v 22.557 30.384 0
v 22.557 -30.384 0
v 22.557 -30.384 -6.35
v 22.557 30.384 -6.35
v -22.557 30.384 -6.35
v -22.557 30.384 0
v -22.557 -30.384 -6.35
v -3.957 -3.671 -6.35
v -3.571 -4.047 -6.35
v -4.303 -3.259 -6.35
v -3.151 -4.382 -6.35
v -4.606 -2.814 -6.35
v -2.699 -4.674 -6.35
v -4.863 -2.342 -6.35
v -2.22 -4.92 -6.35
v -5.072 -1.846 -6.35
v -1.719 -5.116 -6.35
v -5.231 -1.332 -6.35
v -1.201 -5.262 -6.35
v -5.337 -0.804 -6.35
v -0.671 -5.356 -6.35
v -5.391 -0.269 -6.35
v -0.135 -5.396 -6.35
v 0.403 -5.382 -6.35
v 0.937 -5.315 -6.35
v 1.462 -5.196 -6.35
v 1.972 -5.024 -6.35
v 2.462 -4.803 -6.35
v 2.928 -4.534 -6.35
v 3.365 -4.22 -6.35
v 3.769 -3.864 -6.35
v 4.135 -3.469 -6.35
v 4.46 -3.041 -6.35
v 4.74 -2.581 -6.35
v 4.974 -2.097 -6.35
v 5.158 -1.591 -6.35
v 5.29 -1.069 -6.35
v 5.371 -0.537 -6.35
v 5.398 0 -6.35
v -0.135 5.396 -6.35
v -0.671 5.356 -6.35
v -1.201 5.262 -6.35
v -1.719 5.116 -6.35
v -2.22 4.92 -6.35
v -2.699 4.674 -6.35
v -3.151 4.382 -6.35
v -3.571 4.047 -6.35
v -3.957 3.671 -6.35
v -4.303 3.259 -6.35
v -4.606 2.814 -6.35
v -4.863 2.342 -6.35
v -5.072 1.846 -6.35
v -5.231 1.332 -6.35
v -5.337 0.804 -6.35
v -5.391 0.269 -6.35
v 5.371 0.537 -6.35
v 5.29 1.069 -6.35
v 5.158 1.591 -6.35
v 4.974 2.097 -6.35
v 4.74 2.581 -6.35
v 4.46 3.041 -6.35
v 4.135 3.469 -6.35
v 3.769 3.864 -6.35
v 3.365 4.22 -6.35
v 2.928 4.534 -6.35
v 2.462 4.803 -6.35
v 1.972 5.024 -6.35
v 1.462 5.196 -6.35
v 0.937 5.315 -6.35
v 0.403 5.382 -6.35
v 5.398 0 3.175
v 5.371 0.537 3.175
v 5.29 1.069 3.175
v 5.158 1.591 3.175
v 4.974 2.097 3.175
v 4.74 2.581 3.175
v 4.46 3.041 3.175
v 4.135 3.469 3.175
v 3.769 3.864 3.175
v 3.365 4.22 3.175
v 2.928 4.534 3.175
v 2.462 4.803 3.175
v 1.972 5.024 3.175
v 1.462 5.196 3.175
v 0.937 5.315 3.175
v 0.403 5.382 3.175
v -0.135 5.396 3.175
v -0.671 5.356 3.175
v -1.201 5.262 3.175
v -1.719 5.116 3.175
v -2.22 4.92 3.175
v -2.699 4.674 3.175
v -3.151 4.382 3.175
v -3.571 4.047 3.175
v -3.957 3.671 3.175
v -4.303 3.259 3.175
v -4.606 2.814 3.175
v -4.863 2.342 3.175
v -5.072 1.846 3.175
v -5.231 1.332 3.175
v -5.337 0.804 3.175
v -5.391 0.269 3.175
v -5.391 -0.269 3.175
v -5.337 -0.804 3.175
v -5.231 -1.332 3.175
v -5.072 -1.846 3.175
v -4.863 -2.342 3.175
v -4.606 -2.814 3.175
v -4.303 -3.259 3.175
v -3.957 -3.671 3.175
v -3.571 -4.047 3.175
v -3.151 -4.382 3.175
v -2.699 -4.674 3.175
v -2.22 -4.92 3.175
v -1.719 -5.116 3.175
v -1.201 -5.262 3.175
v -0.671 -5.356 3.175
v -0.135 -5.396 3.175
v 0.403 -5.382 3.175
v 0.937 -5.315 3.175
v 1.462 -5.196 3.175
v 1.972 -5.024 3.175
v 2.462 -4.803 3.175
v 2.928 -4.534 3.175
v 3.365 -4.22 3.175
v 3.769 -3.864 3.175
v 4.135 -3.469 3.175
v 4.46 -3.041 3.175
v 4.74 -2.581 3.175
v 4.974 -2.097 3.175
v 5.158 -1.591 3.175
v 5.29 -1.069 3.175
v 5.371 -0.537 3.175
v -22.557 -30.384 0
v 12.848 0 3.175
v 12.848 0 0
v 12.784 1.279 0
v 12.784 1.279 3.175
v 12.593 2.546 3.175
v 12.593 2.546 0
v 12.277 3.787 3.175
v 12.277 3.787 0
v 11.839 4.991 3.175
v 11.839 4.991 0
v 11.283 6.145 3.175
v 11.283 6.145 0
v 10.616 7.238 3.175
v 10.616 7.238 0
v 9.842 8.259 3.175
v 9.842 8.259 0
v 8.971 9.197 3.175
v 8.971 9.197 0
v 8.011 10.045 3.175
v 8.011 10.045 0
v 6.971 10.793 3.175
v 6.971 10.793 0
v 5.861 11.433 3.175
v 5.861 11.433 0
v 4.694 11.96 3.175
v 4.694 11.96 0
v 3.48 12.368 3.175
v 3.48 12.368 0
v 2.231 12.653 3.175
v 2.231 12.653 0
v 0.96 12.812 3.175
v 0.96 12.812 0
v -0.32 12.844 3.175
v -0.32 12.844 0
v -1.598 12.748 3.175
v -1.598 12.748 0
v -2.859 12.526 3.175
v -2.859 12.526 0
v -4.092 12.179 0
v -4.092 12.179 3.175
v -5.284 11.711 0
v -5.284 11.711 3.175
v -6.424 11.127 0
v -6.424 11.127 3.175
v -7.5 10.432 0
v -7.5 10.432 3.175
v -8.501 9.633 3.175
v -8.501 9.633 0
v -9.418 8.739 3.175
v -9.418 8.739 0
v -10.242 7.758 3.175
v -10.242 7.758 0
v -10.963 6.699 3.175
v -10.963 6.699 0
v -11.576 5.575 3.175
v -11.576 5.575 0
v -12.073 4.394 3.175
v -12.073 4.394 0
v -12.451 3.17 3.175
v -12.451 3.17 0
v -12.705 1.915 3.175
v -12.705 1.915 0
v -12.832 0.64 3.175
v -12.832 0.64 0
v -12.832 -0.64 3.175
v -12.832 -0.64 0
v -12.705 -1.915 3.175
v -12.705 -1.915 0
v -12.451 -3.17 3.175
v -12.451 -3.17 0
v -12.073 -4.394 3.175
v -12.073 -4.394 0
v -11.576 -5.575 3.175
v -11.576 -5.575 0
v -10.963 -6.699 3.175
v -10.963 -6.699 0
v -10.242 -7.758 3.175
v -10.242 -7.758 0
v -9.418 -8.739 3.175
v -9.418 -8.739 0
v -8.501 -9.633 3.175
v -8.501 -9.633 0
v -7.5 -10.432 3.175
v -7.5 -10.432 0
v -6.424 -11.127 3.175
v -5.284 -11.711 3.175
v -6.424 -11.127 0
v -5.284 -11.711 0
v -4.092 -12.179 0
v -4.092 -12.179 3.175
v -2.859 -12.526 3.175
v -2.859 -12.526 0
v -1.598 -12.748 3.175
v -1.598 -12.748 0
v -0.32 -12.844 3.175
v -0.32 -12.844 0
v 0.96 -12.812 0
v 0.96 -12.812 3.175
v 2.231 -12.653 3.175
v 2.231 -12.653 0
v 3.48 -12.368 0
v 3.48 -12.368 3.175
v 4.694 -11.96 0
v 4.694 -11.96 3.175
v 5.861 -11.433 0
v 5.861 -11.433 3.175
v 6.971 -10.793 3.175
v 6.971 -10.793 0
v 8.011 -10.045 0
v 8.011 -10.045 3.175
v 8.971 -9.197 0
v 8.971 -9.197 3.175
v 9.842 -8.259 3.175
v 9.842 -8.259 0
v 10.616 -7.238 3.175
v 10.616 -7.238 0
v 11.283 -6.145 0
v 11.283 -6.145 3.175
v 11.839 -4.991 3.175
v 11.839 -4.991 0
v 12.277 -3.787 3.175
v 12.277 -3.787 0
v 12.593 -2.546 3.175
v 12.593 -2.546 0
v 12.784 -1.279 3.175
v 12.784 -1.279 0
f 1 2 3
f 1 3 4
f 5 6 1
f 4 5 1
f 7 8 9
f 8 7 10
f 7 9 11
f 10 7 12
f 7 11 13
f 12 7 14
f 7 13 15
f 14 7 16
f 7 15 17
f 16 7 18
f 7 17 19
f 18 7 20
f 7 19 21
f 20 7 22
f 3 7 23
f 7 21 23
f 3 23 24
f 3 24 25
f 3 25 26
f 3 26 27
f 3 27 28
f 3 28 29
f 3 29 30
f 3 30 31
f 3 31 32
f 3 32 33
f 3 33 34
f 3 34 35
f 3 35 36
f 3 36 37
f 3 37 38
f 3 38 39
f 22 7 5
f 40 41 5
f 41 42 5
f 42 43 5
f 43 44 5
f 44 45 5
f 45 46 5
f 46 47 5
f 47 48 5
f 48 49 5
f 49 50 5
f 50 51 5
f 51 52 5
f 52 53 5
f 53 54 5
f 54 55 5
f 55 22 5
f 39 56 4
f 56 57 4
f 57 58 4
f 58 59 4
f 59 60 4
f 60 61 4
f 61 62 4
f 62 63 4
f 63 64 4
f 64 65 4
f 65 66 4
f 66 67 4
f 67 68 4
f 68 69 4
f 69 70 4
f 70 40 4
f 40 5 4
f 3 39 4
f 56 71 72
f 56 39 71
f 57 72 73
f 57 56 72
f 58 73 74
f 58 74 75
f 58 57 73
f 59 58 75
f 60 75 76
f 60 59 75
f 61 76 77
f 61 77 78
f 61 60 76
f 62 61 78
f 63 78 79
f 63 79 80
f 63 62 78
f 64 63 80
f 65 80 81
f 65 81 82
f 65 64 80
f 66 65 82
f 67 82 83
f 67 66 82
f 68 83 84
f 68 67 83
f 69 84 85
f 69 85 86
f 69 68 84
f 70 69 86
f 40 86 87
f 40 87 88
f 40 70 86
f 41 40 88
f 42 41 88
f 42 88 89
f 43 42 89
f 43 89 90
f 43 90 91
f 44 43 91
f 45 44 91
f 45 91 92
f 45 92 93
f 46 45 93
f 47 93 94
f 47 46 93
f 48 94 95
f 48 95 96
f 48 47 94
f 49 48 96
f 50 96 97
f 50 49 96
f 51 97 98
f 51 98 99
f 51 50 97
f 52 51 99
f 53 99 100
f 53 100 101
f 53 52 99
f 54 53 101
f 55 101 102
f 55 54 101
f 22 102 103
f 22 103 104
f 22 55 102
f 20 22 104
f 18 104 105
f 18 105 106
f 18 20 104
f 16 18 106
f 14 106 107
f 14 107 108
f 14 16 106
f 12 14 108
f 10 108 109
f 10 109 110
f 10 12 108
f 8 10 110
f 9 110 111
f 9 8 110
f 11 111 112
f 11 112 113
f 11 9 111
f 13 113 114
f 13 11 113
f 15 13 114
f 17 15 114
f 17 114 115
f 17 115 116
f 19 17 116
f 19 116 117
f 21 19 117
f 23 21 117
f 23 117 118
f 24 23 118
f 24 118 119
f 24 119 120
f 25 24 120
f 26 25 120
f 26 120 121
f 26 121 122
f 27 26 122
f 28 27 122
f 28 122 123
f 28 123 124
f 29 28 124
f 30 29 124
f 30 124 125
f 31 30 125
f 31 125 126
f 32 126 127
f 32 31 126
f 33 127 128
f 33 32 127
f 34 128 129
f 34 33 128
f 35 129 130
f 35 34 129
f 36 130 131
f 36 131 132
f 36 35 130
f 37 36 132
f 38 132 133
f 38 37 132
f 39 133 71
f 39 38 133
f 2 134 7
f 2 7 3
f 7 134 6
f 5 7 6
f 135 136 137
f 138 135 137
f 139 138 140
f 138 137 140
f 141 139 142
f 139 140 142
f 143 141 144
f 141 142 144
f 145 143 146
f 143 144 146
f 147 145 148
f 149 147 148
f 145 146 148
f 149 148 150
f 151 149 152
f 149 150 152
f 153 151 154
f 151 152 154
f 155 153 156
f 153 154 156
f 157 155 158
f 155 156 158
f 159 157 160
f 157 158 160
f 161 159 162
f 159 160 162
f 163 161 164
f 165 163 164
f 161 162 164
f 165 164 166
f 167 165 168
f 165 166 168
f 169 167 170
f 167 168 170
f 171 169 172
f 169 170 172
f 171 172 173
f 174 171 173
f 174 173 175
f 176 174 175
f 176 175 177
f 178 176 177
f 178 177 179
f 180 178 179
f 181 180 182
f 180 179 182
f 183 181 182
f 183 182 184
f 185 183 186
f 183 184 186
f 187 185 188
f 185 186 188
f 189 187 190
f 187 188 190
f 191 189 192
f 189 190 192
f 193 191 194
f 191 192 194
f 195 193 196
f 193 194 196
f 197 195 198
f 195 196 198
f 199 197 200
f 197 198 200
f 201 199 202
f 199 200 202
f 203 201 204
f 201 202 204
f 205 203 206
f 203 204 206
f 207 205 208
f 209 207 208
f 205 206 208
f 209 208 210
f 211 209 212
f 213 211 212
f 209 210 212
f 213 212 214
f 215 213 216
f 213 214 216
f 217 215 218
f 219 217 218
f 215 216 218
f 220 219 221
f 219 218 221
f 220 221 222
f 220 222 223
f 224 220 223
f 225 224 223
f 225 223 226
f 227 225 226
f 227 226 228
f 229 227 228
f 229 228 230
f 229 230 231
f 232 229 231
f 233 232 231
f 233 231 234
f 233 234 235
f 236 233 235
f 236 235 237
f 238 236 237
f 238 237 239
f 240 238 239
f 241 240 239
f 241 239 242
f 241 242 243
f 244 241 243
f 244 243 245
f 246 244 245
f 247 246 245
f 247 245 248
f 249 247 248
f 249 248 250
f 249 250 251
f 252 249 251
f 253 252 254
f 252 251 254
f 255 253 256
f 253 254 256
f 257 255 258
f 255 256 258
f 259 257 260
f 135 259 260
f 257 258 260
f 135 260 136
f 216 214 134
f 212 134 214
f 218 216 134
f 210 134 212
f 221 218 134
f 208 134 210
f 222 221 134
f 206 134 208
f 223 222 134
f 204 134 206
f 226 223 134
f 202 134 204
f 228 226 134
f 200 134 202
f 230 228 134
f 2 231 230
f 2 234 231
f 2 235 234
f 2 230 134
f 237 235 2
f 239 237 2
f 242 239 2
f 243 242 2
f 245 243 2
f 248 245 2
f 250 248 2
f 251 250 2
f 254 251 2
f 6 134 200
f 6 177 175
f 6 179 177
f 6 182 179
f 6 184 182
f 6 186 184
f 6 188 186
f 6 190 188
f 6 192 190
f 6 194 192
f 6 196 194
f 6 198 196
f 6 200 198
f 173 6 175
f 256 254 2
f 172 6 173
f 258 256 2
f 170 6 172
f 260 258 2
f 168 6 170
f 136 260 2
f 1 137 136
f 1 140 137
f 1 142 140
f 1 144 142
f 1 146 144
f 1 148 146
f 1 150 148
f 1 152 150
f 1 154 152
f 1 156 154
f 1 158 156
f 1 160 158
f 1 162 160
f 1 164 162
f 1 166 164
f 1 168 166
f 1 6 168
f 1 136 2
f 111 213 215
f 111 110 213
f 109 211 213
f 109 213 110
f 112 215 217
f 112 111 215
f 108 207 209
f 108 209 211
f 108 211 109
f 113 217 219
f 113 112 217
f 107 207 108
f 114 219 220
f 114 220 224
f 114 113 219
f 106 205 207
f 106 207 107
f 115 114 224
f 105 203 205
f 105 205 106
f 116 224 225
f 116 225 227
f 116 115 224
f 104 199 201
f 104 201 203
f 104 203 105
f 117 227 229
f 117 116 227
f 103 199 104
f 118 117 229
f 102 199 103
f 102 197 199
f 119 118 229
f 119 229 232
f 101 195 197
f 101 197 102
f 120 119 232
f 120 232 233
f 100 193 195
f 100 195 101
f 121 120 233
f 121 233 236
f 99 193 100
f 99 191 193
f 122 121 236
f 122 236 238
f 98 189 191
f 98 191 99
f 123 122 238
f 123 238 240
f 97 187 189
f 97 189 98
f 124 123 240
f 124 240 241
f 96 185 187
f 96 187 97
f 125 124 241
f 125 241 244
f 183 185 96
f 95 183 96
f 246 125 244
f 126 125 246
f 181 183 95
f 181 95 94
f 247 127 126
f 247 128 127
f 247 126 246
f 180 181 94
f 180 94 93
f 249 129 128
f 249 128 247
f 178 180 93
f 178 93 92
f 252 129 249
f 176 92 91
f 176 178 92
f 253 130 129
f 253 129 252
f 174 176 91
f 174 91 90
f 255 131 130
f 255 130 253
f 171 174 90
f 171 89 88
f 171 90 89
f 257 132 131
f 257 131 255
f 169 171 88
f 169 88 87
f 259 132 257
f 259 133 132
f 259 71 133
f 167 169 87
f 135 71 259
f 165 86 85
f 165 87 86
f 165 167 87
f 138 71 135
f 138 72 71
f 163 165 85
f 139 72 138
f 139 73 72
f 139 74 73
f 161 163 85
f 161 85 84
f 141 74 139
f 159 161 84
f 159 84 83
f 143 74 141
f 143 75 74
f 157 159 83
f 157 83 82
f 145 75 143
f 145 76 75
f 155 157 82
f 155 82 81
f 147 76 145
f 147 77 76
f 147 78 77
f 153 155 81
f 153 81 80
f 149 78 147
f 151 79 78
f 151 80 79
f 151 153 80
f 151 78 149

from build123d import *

# Parameters (mm, degrees)
F0_W     = 45.113686
F0_H     = 60.767936
F0_R     = 12.848054
F0_R_2   = 5.3975
F1_DEPTH = 6.35
F2_DEPTH = 3.175


with BuildPart() as f1:
    # F0 (on Top) → F1 (new body)
    with BuildSketch(Plane.XY):
        Rectangle(F0_W, F0_H)
        Circle(F0_R, mode=Mode.SUBTRACT)
        Circle(F0_R)
        Circle(F0_R_2, mode=Mode.SUBTRACT)
    extrude(amount=-F1_DEPTH)

    # F0 (on Top) → F2 (join)
    with BuildSketch(Plane.XY):
        Circle(F0_R)
        Circle(F0_R_2, mode=Mode.SUBTRACT)
    extrude(amount=F2_DEPTH)


solid = f1.part
